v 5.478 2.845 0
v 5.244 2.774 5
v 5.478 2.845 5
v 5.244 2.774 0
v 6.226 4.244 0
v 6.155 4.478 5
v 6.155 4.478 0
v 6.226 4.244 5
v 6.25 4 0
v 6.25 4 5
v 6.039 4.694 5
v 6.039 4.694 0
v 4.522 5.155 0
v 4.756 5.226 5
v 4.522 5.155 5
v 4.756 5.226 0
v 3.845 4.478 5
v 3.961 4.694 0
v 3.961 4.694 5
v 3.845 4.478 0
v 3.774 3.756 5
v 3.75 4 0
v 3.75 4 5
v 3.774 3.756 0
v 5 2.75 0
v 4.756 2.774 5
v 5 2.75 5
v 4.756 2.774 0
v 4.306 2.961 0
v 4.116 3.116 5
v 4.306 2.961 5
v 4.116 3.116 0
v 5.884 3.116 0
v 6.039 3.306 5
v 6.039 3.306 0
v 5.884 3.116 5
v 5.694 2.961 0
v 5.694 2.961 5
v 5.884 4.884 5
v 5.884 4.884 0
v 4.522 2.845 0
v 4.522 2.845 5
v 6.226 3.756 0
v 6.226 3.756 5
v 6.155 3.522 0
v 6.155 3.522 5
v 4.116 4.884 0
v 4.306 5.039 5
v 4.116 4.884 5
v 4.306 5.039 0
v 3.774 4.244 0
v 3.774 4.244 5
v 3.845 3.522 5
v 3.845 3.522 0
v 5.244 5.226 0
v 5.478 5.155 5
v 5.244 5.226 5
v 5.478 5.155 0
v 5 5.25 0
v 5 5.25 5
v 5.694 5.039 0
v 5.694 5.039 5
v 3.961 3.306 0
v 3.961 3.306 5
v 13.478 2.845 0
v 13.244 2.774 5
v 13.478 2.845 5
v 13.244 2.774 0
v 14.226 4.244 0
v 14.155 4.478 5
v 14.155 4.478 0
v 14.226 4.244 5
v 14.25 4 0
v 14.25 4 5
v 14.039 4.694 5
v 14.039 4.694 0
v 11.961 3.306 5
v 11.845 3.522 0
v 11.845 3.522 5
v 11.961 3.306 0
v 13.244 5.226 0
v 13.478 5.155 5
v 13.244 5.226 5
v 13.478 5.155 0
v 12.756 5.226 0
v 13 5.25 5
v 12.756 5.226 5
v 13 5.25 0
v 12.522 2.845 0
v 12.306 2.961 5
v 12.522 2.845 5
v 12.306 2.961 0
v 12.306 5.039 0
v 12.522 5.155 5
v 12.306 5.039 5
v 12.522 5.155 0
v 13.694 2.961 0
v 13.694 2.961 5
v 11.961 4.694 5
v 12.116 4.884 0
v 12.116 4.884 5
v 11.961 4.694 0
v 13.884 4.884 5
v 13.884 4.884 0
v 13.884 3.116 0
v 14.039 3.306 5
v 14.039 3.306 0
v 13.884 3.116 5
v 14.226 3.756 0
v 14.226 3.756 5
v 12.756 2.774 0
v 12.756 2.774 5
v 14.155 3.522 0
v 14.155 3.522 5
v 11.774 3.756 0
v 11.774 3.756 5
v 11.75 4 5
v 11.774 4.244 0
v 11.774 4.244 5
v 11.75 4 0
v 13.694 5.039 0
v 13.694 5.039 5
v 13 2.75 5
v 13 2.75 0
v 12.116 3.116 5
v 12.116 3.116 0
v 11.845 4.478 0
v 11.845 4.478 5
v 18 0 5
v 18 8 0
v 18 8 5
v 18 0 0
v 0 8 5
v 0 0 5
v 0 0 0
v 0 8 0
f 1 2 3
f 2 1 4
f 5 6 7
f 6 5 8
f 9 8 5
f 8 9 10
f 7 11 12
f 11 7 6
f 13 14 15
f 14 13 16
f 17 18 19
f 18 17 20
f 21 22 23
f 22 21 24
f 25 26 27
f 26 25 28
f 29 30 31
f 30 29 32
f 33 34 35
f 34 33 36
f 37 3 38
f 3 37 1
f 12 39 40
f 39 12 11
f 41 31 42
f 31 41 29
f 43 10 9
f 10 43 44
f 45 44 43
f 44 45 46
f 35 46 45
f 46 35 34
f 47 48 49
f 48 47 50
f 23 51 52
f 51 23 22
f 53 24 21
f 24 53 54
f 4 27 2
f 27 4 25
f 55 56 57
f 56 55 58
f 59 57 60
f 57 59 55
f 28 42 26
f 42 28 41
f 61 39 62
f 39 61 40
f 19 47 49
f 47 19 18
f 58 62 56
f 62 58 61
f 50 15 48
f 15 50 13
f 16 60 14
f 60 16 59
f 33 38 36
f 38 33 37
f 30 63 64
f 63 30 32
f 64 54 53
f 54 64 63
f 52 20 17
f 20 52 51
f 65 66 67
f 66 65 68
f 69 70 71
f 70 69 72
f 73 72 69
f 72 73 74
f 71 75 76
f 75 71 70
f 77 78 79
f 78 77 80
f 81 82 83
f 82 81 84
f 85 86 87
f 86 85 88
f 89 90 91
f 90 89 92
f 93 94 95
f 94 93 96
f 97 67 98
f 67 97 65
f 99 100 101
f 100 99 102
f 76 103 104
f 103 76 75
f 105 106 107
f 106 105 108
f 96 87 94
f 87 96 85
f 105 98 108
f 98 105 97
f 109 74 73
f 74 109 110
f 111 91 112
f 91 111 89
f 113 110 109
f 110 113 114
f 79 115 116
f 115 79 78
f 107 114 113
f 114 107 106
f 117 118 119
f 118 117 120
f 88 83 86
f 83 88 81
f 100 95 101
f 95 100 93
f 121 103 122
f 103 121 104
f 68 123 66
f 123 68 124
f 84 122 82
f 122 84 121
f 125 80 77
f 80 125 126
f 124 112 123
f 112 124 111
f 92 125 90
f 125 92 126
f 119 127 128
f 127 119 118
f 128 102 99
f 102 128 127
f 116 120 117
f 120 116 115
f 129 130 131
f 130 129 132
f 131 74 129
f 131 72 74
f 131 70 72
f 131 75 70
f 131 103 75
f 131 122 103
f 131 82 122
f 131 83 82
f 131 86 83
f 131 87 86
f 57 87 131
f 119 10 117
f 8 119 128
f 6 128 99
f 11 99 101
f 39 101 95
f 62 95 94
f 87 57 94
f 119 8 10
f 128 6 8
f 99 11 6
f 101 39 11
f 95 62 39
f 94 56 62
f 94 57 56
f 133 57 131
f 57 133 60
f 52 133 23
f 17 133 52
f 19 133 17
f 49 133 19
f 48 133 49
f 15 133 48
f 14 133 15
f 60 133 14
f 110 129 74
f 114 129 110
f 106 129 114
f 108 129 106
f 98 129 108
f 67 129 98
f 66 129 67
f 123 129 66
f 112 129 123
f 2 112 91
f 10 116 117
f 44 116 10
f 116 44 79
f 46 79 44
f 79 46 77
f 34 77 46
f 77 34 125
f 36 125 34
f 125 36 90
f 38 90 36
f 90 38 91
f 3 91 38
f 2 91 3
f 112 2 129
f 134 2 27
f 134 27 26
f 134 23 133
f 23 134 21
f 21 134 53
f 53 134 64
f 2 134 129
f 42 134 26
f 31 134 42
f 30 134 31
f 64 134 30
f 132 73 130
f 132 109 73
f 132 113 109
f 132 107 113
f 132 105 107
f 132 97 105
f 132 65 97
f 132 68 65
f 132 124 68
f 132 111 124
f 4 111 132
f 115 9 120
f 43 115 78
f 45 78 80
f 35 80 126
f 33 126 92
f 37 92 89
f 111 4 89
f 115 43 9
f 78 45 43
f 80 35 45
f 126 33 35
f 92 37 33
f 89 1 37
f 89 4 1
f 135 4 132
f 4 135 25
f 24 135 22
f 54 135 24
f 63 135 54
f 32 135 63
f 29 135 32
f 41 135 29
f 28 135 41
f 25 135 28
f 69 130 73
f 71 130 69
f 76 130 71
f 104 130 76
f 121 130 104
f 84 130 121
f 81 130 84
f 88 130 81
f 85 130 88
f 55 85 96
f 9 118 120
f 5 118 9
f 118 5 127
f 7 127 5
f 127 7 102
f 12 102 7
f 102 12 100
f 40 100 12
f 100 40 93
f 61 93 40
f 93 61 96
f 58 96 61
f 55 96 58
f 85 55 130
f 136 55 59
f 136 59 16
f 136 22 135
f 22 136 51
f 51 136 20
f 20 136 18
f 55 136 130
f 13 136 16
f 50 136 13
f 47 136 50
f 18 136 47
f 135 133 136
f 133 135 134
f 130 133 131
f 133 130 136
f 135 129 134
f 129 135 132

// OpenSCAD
$fn = 32;

// ----------------------------------------------------------------------
// Micro pad: two-hole pad, 5-20 mm class
// ----------------------------------------------------------------------

// --- parameters (mm) ---
pad_l = 18;               // pad length, X
pad_w = 8;                // pad width, Y
pad_t = 5;                // pad thickness, Z
hole_d = 2.5;             // hole diameter
hole_x = 5;               // X of the first hole centre

difference() {
  cube([pad_l, pad_w, pad_t]);
  for (x = [hole_x, pad_l - hole_x])
    translate([x, pad_w / 2, -1])
      cylinder(h = pad_t + 2, d = hole_d);
}
